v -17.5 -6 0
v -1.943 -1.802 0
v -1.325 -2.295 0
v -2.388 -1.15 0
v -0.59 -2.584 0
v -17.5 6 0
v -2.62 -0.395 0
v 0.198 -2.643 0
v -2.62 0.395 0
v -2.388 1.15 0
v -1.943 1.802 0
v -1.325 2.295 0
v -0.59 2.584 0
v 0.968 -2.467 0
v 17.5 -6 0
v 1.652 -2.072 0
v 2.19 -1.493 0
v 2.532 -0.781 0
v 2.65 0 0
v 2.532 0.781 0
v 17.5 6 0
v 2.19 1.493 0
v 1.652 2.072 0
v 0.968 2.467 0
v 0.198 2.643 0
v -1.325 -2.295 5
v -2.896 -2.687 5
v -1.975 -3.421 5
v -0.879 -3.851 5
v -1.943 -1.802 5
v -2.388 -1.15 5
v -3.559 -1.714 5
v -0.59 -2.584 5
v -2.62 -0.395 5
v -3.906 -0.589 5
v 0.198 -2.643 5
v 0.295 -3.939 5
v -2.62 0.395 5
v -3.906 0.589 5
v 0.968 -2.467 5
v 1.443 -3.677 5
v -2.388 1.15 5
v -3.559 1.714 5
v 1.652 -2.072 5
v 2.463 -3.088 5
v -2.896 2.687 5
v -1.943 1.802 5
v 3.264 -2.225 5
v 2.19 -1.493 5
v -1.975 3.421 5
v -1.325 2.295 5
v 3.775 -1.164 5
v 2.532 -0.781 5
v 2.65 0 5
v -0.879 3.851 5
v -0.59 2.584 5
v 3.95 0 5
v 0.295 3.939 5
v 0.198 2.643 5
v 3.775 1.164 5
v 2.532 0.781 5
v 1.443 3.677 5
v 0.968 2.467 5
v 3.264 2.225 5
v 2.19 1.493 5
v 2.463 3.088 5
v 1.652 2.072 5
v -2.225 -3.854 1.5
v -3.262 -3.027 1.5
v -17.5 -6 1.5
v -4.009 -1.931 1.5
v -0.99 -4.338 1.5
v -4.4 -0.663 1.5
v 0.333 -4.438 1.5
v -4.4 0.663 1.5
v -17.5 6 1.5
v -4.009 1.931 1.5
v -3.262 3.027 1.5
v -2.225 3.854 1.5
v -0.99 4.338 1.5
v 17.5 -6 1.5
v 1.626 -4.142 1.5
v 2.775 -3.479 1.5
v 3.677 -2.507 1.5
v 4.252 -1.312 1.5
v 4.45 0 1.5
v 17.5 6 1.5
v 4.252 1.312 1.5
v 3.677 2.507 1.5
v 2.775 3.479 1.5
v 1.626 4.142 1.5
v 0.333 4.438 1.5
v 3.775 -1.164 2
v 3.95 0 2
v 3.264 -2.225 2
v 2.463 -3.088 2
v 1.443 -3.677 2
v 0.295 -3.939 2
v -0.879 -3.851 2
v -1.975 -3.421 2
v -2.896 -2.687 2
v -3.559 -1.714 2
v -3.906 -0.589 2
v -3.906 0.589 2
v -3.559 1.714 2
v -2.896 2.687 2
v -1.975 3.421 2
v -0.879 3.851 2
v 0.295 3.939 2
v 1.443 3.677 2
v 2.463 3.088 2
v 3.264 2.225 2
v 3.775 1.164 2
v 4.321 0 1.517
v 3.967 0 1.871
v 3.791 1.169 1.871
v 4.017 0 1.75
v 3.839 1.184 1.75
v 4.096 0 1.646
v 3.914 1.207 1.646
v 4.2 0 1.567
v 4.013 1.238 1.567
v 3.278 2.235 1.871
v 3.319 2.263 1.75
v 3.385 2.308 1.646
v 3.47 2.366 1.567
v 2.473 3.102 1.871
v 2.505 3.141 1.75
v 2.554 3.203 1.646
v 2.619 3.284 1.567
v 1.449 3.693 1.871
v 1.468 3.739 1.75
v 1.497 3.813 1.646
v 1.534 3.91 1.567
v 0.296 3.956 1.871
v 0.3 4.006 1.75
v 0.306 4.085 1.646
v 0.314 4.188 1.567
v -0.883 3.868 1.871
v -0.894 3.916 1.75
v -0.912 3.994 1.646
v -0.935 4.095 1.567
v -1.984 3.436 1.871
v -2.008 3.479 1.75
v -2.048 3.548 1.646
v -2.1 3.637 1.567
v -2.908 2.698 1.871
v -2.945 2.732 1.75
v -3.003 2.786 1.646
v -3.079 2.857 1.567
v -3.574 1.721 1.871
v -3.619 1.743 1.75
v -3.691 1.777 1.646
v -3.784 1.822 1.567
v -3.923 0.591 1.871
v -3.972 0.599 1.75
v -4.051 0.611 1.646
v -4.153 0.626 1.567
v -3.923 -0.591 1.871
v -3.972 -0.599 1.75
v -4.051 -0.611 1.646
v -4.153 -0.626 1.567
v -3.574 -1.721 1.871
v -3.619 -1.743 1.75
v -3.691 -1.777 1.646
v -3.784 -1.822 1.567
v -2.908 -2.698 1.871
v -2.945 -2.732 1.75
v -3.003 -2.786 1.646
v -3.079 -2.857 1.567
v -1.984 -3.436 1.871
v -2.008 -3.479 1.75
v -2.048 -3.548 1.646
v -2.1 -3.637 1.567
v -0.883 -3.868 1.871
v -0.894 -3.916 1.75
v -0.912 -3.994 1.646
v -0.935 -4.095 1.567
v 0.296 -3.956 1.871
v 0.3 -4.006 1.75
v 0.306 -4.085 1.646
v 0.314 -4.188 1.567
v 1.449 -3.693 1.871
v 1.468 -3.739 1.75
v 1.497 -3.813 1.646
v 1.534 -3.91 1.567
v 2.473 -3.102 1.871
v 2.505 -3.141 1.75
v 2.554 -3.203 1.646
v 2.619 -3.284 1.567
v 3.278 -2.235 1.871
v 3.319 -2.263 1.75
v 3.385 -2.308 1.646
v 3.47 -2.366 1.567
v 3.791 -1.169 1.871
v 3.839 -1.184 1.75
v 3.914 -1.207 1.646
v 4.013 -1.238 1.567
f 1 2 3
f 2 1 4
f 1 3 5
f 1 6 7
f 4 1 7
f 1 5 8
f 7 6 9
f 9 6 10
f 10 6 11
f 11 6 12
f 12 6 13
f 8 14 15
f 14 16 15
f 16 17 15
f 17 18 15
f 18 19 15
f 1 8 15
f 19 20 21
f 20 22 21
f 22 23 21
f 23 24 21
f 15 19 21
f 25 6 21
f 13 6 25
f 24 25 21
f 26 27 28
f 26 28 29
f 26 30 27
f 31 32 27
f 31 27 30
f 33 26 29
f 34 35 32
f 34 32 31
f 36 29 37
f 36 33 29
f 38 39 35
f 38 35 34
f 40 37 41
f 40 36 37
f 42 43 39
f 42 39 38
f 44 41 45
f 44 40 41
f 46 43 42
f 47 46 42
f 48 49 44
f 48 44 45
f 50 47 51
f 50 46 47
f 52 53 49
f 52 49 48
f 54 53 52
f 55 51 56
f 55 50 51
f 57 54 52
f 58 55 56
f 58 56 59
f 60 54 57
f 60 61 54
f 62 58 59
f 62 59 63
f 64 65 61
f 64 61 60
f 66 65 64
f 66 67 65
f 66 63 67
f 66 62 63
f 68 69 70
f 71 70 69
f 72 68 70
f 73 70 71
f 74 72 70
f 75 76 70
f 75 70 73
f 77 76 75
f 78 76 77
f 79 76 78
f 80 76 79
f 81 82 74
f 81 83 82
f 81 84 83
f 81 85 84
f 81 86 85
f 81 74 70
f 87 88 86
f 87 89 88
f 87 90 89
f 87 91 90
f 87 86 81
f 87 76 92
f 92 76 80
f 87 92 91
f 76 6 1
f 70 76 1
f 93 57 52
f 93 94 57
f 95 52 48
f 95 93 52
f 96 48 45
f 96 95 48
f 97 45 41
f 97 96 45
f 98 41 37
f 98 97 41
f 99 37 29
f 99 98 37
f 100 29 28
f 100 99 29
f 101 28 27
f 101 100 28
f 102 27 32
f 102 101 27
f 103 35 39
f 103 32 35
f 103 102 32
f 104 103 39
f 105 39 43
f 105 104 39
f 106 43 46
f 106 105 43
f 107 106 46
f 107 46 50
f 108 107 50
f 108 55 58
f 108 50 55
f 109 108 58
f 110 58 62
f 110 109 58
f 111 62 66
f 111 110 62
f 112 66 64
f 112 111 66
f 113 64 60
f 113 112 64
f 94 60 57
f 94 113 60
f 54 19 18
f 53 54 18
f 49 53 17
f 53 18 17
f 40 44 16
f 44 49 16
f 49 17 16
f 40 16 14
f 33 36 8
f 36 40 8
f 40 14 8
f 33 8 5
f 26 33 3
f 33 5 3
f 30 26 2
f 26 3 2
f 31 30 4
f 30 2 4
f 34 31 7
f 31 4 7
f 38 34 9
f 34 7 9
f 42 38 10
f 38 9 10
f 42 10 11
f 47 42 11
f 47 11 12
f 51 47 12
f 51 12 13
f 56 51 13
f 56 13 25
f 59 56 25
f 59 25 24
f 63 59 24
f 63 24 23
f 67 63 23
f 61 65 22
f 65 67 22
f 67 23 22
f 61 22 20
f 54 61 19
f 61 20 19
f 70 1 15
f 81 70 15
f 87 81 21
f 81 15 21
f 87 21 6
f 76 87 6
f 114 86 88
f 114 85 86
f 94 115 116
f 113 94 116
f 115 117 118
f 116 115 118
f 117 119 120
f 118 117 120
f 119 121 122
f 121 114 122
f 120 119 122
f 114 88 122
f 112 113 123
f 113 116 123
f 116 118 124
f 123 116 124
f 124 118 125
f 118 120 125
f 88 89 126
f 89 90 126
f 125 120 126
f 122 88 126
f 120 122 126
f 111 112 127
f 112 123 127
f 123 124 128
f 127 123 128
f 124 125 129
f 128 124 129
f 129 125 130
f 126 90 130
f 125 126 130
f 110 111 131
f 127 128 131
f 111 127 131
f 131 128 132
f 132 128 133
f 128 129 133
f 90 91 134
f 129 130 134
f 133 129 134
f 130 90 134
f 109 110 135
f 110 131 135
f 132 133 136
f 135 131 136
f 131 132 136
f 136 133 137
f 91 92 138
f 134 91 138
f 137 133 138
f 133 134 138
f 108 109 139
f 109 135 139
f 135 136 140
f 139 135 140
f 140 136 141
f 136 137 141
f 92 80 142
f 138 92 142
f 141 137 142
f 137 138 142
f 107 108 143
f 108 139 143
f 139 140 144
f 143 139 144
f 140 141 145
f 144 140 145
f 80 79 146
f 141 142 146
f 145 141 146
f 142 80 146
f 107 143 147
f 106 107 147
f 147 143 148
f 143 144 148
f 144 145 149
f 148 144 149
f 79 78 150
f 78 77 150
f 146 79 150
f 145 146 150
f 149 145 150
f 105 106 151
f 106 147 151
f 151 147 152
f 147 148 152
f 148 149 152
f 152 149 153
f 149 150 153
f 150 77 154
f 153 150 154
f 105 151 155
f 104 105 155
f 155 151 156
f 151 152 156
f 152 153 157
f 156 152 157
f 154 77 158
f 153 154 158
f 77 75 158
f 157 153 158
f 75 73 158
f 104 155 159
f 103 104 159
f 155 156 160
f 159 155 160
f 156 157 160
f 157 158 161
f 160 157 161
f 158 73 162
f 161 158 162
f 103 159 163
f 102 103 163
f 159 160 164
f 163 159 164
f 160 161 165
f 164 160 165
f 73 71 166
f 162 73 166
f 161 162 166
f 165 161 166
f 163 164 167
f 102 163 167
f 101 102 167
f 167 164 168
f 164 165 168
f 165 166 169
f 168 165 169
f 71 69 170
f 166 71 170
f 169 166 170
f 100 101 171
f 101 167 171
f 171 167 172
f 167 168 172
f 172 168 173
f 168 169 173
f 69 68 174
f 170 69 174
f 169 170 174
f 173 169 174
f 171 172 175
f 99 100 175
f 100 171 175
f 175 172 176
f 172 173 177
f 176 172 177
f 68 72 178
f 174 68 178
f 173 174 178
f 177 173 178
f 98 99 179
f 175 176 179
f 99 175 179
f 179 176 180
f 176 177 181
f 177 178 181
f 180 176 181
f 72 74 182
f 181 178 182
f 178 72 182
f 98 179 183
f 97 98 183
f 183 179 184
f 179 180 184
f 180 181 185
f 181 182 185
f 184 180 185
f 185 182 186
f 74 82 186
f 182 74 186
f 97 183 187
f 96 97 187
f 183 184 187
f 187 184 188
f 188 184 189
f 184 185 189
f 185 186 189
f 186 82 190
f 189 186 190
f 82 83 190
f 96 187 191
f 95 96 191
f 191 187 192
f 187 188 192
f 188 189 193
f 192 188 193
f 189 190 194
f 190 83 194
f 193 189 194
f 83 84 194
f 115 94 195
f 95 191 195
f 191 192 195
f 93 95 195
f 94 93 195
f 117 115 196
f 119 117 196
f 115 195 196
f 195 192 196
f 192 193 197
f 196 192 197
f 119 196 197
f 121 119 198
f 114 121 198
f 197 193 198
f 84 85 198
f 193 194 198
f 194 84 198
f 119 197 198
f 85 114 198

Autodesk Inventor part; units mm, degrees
ref_plane "YZ Plane" through (0, 0, 0) normal (1, 0, 0) x (0, 1, 0)
ref_plane "XZ Plane" through (0, 0, 0) normal (0, 1, 0) x (-1, 0, 0)
ref_plane "XY Plane" through (0, 0, 0) normal (0, 0, 1) x (1, 0, 0)
sketch "Skizze1" plane through (0, 0, 0) normal (0, 0, 1) x (1, 0, 0)
  line L0 (-17.5, -6) -> (17.5, -6)
  line L1 (17.5, -6) -> (17.5, 6)
  line L2 (17.5, 6) -> (-17.5, 6)
  line L3 (-17.5, 6) -> (-17.5, -6)
  line L4 (-17.5, -6) -> (17.5, 6) construction
  line L5 (17.5, -6) -> (-17.5, 6) construction
  point P0 (0, 0)
  dimension "d0" = 35
  dimension "d1" = 12
extrude "Extrusion1" add sketch "Skizze1" along normal blind 1.5
sketch "Skizze2" plane through (0, 0, 1.5) normal (0, 0, 1) x (1, 0, 0)
  circle A0 centre (0, 0) radius 2.65
  dimension "d4" = 5.3
extrude "Extrusion2" cut sketch "Skizze2" against normal blind 1.5
sketch "Skizze3" plane through (0, 0, 1.5) normal (0, 0, 1) x (1, 0, 0)
  circle A0 centre (0, 0) radius 3.95
  circle A1 centre (0, 0) radius 2.65 projected
  dimension "d7" = 7.9
extrude "Extrusion3" add sketch "Skizze3" along normal blind 3.5
fillet "Rundung1" radius 0.5 1 edges at (-3.95, 0, 1.5)
equation "\"G_L\" = 0"
equation "\"G_H\" = 0"
equation "\"G_B\" = 0"
properties part number "propstop" material "GEDA Stahl"
